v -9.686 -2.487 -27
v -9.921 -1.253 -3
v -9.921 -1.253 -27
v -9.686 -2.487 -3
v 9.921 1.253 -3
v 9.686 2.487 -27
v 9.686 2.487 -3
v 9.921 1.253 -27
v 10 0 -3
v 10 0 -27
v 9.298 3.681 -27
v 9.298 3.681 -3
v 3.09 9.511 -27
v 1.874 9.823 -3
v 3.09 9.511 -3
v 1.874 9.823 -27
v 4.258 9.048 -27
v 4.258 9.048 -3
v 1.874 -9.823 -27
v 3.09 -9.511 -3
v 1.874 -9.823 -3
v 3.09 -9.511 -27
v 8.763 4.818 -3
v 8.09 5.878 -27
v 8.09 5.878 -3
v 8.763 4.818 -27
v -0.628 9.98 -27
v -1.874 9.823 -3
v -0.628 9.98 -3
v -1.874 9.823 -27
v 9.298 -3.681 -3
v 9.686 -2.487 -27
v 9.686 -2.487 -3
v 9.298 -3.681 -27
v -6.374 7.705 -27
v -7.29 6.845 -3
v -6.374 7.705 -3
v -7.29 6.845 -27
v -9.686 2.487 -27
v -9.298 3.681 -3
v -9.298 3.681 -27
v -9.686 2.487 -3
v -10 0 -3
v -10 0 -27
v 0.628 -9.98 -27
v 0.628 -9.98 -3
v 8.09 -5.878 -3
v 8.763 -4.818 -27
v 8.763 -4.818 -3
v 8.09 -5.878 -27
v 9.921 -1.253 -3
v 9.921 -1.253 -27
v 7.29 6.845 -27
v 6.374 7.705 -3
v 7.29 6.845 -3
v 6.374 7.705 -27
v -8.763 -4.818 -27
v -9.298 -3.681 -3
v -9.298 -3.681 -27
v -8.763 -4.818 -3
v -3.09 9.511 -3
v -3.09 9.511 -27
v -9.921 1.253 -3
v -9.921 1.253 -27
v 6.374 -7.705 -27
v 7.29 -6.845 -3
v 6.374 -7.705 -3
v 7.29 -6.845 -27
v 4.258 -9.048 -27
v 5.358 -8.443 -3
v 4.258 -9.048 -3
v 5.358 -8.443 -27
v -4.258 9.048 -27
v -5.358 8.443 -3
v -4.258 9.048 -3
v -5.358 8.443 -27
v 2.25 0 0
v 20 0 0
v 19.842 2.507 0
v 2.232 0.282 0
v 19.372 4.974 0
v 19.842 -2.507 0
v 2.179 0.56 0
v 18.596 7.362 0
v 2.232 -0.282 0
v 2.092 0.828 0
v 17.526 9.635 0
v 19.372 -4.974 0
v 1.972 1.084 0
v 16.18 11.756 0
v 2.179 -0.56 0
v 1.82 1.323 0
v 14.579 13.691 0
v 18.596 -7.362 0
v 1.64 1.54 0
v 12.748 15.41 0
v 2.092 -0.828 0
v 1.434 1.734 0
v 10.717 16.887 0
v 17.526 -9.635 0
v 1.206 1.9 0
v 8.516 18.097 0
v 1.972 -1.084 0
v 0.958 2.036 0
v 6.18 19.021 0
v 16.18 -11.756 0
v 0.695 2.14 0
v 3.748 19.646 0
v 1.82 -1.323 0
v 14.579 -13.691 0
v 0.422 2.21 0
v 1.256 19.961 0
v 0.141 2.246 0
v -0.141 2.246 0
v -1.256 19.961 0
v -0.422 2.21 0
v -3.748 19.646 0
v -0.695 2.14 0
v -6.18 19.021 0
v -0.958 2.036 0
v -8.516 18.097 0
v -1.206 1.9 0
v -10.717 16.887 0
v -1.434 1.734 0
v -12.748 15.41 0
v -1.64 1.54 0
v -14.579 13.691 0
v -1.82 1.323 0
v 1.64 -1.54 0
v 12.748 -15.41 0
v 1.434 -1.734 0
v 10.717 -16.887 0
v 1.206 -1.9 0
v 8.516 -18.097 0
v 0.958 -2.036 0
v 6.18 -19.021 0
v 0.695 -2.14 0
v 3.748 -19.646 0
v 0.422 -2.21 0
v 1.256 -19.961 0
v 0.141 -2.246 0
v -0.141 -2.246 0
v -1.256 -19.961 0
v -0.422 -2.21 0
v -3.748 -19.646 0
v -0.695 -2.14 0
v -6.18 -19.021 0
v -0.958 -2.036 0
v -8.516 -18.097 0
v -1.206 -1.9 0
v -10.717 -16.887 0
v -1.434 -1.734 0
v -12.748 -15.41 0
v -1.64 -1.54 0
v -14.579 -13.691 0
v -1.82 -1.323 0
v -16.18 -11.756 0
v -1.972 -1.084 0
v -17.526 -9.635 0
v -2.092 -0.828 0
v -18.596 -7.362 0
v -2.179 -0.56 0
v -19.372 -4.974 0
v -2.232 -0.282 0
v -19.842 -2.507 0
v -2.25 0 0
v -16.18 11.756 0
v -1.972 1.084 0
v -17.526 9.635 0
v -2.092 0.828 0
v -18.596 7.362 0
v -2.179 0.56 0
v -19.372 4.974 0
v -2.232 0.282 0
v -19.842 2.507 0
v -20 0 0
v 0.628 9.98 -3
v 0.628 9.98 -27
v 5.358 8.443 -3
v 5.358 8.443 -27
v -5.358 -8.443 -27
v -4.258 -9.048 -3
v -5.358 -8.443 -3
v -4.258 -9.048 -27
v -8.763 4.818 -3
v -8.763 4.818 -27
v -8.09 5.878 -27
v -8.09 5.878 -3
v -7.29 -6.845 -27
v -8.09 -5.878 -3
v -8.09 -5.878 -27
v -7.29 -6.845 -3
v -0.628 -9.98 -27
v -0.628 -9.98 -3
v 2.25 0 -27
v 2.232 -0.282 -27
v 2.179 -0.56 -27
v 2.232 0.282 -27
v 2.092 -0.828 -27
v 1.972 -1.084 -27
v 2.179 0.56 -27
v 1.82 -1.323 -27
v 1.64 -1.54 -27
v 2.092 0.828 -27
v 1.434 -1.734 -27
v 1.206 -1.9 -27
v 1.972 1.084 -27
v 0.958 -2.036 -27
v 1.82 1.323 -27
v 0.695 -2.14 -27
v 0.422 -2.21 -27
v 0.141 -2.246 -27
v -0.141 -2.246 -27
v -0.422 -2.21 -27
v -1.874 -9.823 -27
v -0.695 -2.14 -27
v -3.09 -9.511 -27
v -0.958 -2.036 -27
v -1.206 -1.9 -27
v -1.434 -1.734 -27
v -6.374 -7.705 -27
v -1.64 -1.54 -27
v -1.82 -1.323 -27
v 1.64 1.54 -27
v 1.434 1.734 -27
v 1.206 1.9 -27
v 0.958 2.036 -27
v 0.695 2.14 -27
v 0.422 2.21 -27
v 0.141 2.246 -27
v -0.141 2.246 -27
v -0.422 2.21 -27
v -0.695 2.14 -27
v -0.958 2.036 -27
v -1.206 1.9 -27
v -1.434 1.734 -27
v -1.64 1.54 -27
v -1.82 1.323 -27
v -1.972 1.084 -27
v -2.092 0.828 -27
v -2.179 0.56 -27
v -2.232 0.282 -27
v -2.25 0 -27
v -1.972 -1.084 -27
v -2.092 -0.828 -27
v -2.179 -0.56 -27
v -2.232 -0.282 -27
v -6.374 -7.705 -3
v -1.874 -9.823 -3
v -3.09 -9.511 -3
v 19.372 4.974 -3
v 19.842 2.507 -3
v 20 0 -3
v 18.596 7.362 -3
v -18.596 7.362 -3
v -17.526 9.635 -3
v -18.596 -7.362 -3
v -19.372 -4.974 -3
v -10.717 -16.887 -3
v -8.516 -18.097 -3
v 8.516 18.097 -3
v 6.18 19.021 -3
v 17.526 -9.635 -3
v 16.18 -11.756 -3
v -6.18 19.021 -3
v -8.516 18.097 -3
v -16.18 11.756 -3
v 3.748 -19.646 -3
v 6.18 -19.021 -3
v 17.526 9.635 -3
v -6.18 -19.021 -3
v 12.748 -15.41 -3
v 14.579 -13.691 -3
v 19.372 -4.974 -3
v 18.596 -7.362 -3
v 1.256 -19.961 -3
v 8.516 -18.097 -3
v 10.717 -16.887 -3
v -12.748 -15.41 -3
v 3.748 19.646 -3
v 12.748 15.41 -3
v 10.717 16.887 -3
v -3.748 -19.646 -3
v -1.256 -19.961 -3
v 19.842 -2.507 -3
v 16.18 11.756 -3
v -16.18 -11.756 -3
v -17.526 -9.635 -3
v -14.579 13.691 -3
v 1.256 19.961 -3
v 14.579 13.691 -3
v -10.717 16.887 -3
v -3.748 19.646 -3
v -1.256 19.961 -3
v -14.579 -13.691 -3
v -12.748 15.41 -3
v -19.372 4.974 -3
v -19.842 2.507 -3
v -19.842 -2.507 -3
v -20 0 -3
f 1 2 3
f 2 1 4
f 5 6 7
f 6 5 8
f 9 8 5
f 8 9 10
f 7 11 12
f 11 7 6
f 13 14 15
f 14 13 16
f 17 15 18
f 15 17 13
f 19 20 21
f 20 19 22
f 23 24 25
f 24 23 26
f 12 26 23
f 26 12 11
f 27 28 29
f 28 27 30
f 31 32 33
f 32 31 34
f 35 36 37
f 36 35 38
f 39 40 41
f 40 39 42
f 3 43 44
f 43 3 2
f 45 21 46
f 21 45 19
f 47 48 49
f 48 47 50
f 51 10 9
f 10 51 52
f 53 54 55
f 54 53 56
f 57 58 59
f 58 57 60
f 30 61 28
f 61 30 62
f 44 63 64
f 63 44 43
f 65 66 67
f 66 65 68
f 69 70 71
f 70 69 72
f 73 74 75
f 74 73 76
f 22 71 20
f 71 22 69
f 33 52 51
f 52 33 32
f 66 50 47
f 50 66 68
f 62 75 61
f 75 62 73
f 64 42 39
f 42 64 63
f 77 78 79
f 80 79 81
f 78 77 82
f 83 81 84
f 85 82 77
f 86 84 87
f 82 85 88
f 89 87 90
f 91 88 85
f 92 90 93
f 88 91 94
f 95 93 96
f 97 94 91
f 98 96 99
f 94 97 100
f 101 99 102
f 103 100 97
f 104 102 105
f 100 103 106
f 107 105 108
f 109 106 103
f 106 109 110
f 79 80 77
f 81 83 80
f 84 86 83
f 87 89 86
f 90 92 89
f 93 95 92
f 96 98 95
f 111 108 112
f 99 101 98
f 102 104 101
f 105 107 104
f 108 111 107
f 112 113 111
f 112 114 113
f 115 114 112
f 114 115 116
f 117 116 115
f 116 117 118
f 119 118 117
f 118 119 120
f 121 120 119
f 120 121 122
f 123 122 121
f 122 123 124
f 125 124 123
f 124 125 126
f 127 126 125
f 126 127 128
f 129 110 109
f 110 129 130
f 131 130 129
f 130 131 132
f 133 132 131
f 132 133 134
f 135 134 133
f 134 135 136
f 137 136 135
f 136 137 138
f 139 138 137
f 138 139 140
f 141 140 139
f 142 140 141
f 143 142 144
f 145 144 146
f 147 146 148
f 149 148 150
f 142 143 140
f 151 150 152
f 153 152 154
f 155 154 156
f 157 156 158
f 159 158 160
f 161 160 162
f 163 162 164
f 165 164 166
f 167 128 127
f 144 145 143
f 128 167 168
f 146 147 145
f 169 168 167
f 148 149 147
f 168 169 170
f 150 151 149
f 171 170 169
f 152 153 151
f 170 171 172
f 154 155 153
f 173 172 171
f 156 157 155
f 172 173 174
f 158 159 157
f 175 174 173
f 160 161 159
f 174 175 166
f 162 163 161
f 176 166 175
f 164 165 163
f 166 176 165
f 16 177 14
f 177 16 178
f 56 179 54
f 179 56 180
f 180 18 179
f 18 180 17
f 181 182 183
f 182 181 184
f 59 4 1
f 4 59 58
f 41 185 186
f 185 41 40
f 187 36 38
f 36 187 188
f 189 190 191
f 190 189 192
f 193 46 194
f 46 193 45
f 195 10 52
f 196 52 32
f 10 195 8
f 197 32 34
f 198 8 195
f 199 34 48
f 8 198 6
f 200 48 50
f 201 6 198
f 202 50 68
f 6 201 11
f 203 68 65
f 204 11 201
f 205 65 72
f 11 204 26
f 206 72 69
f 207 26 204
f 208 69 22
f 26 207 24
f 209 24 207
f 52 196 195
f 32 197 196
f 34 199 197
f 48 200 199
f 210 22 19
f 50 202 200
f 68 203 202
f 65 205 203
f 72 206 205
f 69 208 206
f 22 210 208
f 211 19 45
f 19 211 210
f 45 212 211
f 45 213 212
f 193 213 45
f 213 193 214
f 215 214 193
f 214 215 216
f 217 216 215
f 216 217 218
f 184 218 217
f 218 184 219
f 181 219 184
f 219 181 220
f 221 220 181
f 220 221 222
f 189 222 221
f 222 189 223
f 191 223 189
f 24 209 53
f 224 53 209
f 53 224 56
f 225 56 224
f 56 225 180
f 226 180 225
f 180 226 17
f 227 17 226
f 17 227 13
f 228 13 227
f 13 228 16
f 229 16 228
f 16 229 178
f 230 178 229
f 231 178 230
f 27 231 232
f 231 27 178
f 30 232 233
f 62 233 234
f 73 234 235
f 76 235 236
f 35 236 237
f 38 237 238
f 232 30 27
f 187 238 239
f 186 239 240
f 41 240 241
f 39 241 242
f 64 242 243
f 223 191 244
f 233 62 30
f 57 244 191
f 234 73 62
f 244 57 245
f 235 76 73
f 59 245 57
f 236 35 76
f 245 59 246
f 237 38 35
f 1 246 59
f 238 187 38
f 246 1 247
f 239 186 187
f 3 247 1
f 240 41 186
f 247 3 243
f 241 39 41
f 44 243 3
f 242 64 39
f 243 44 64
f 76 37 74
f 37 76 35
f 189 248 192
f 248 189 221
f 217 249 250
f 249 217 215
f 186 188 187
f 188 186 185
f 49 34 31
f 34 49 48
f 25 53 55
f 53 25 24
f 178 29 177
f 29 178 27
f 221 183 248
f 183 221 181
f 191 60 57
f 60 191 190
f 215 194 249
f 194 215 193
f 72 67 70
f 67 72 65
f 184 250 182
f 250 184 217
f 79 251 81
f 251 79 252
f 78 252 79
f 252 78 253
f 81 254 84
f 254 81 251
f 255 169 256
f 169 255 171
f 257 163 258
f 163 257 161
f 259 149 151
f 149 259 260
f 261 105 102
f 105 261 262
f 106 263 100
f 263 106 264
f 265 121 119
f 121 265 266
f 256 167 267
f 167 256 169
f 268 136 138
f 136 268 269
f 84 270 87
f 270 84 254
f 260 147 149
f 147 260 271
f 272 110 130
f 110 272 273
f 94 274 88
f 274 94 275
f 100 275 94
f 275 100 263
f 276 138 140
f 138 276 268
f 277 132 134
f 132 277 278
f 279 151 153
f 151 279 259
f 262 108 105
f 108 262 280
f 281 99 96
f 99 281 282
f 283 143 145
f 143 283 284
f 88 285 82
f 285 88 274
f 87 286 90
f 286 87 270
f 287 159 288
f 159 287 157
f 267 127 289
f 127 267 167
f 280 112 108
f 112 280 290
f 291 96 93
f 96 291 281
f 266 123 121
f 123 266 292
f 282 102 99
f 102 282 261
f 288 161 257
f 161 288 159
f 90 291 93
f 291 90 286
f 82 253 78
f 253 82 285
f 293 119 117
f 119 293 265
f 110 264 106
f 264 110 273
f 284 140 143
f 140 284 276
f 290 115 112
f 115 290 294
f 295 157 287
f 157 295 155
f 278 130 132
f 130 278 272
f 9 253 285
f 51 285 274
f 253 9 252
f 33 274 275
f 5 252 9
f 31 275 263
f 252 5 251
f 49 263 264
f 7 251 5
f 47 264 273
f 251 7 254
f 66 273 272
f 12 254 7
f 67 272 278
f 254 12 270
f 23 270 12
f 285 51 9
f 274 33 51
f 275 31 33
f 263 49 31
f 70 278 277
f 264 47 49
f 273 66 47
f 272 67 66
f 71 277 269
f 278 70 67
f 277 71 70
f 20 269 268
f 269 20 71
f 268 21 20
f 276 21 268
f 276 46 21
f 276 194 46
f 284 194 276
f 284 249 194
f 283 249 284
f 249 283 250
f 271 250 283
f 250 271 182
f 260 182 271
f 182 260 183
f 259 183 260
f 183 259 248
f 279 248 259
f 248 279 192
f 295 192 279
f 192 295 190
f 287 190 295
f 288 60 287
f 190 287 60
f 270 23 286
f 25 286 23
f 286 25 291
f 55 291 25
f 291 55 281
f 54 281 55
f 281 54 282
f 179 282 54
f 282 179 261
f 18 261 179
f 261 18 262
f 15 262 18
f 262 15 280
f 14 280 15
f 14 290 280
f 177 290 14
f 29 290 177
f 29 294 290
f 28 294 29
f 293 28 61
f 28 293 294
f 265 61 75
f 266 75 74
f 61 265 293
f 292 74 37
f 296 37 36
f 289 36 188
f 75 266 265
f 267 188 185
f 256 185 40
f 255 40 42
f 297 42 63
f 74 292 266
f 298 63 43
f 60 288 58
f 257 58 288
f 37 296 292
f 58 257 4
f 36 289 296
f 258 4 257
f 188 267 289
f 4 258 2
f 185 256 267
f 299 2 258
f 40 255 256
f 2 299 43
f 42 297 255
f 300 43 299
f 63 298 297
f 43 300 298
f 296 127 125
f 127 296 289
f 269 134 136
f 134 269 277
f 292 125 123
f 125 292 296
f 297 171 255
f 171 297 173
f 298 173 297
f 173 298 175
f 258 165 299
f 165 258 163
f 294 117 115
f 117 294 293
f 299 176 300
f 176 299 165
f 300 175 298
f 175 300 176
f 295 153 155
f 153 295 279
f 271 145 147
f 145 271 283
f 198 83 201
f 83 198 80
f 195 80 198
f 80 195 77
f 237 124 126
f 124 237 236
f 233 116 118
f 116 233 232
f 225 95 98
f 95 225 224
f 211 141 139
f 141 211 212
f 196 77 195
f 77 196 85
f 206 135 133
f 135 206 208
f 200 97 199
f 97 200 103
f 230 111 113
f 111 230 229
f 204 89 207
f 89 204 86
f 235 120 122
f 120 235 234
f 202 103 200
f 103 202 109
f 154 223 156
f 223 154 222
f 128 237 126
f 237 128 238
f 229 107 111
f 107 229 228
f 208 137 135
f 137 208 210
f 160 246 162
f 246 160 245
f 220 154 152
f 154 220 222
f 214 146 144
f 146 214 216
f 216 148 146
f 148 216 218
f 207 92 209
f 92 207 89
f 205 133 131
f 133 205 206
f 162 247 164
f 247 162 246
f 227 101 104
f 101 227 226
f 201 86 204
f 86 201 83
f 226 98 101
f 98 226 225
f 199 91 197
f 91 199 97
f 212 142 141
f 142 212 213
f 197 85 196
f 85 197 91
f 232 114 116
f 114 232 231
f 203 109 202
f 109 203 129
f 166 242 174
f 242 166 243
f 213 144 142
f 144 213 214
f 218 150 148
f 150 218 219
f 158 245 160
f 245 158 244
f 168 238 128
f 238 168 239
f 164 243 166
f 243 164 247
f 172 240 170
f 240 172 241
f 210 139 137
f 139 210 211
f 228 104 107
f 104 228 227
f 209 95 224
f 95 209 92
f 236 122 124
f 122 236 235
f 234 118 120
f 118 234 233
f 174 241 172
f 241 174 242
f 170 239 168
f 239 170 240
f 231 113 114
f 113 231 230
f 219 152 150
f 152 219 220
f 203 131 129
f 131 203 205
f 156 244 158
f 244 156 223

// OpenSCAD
$fn = 50;


difference() {
	union() {
		translate(v = [0, 0, -27.0000000000]) {
			cylinder(h = 27, r = 10.0000000000);
		}
		translate(v = [0, 0, -3.0000000000]) {
			cylinder(h = 3, r = 20.0000000000);
		}
	}
	union() {
		#translate(v = [0, 0, -27]) {
			cylinder(h = 27, r = 2.2500000000);
		}
	}
}
